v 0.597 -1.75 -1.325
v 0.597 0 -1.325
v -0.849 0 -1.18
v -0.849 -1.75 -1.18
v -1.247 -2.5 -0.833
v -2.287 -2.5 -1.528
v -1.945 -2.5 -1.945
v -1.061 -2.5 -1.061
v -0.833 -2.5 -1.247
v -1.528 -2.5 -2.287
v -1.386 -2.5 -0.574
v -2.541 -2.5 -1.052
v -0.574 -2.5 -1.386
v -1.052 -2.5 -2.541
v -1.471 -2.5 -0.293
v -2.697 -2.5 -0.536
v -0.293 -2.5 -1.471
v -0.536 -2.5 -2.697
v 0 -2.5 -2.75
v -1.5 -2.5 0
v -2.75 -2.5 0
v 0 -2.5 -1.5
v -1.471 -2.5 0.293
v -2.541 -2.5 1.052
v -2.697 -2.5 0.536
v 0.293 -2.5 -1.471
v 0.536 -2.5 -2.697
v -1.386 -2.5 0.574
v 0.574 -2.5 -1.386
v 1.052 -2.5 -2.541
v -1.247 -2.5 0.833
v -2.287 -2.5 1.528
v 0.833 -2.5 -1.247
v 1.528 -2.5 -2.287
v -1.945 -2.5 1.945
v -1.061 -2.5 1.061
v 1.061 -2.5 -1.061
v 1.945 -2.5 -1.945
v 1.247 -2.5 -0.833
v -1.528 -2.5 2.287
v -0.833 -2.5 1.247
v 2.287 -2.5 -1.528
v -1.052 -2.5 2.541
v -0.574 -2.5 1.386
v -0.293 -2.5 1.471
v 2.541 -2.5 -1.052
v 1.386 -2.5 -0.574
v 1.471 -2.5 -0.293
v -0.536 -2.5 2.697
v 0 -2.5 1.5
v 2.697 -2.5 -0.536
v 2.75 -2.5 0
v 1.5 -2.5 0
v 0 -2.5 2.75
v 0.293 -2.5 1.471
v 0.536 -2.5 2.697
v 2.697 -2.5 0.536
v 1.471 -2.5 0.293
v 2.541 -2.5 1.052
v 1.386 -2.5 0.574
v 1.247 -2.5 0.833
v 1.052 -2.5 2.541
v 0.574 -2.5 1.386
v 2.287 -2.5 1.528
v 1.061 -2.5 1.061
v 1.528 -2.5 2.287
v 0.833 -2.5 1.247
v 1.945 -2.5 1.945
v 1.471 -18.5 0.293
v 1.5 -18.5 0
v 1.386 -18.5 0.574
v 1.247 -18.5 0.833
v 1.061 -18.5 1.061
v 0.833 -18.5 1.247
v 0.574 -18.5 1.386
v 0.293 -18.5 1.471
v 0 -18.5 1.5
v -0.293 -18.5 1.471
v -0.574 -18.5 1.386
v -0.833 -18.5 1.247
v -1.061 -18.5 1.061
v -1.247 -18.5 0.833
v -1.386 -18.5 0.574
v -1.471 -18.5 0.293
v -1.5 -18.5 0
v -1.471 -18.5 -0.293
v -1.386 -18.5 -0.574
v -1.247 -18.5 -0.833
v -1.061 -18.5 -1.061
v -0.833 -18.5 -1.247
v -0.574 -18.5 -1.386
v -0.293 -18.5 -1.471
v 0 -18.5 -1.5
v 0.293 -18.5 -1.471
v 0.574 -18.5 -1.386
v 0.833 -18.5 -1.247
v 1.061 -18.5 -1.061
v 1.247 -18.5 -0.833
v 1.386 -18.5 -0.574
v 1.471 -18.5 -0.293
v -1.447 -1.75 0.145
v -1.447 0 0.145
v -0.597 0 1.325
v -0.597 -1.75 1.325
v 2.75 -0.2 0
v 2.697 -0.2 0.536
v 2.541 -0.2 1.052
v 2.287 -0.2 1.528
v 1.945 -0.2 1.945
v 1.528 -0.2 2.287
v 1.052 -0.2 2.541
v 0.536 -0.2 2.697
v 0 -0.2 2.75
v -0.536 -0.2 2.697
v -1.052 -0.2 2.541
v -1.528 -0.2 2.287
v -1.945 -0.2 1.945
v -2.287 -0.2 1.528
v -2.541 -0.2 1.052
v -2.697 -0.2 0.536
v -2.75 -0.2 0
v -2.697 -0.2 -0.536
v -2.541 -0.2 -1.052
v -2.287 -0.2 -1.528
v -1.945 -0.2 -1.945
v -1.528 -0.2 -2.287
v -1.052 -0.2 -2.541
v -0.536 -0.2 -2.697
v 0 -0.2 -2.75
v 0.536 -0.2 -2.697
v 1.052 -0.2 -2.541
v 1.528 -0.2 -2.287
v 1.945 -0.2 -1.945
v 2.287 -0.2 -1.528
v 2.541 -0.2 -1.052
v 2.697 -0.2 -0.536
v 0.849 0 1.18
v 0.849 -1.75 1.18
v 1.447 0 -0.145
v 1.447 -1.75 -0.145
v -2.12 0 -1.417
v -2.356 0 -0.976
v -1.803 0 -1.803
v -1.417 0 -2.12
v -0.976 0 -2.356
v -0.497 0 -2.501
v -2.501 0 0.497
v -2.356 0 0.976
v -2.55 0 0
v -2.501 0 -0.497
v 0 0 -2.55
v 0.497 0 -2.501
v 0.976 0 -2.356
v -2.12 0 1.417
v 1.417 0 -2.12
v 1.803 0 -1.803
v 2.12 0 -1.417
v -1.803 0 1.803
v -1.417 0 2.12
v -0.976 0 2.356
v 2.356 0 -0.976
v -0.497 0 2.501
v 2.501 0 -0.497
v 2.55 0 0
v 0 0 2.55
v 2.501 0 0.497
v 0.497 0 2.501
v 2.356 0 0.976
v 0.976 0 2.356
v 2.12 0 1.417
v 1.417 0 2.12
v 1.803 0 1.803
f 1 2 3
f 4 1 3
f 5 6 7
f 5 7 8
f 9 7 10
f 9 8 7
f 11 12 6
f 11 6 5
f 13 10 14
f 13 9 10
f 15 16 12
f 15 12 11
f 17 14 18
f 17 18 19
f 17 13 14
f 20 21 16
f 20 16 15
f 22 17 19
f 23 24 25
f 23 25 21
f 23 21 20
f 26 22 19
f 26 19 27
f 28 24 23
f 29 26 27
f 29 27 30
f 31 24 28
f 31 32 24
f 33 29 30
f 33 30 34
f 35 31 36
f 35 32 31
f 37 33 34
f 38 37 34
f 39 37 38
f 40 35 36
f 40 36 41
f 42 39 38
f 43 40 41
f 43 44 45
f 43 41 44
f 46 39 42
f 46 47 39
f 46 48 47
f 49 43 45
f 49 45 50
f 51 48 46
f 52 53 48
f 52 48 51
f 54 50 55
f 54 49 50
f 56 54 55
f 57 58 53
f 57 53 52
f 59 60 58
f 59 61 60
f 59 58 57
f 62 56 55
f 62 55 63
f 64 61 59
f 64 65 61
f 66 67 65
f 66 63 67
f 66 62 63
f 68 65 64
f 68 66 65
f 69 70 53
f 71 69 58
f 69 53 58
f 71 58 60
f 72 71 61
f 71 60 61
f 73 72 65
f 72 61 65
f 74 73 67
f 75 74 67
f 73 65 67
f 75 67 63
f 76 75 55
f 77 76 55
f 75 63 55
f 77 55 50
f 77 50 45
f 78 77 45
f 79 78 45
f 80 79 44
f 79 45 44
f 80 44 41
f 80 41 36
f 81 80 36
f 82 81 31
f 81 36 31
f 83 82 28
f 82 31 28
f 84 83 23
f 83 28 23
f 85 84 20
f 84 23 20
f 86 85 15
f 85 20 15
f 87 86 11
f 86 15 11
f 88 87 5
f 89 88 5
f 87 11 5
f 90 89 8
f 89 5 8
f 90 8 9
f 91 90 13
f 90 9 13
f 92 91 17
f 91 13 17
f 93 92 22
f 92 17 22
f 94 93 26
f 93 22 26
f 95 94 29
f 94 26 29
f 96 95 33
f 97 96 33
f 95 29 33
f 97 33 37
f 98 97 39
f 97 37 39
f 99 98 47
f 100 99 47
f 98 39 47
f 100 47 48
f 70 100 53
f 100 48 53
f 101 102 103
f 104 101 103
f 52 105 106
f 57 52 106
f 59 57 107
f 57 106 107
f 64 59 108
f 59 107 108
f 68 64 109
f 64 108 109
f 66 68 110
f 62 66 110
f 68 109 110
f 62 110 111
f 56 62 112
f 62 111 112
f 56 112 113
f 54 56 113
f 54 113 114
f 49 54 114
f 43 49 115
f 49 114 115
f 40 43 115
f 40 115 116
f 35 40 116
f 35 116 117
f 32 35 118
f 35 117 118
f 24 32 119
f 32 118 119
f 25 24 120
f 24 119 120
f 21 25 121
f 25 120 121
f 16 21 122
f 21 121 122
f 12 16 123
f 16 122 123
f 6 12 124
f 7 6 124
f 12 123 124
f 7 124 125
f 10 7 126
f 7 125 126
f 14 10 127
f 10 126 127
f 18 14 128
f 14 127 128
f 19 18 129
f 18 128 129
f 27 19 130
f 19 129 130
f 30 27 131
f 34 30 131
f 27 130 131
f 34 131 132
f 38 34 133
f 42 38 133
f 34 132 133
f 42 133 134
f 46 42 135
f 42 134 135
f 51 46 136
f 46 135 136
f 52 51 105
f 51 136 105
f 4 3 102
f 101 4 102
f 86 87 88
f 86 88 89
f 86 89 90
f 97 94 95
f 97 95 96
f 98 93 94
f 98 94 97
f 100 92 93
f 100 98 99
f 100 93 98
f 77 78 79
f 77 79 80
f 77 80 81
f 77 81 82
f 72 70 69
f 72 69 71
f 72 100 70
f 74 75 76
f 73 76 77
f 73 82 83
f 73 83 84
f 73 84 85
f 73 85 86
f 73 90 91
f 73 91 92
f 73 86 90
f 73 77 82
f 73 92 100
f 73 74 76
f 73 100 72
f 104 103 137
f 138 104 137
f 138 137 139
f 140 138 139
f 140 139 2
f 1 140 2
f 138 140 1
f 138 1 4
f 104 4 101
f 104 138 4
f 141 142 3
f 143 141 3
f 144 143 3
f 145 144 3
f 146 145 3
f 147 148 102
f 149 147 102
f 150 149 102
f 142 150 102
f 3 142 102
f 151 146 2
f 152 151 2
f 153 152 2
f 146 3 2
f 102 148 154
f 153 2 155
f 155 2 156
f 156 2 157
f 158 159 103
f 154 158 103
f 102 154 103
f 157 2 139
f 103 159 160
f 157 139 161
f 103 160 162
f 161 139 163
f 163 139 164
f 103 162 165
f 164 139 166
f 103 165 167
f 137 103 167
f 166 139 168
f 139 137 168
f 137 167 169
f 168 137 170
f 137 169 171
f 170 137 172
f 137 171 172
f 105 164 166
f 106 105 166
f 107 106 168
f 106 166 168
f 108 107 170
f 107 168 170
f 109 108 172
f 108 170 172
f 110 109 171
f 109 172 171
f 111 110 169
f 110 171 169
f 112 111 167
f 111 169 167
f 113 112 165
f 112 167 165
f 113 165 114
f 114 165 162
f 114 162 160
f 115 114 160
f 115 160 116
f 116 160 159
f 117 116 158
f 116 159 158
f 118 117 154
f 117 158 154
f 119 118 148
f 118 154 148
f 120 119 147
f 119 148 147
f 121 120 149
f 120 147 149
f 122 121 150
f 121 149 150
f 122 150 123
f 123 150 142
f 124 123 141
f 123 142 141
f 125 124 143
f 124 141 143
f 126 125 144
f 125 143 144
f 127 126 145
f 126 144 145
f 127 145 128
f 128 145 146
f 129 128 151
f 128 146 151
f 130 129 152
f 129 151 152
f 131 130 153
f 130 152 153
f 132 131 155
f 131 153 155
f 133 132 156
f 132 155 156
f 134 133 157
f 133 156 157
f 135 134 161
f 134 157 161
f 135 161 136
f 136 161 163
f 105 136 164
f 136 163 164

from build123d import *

# Parameters (mm, degrees)
F0_R     = 2.75
F1_DEPTH = 2.5
F3_DEPTH = 1.75
F4_SIZE  = 0.2
F5_R     = 1.5
F6_DEPTH = 16


with BuildPart() as f1:
    # F0 (on Front) → F1 (new body)
    with BuildSketch(Plane.XZ):
        Circle(F0_R)
    extrude(amount=F1_DEPTH)

    # F2 (on face) → F3 (cut)
    with BuildSketch(Plane(origin=(0, 0, 0), x_dir=(-1, 0, 0), z_dir=(0, 1, 0))):
        Polygon((1.446581, 0.145307), (0.597451, 1.325429), (-0.84913, 1.180122), (-1.446581, -0.145307), (-0.597451, -1.325429), (0.84913, -1.180122), align=None)
    extrude(amount=-F3_DEPTH, mode=Mode.SUBTRACT)

    # F4
    f4_edges = [f1.edges().sort_by_distance(p)[0] for p in [
        (-2.75, 0, 0),
    ]]
    chamfer(f4_edges, length=F4_SIZE)

    # F5 (on face) → F6 (join)
    with BuildSketch(Plane.XZ.offset(2.5)):
        Circle(F5_R)
    extrude(amount=F6_DEPTH)


solid = f1.part
